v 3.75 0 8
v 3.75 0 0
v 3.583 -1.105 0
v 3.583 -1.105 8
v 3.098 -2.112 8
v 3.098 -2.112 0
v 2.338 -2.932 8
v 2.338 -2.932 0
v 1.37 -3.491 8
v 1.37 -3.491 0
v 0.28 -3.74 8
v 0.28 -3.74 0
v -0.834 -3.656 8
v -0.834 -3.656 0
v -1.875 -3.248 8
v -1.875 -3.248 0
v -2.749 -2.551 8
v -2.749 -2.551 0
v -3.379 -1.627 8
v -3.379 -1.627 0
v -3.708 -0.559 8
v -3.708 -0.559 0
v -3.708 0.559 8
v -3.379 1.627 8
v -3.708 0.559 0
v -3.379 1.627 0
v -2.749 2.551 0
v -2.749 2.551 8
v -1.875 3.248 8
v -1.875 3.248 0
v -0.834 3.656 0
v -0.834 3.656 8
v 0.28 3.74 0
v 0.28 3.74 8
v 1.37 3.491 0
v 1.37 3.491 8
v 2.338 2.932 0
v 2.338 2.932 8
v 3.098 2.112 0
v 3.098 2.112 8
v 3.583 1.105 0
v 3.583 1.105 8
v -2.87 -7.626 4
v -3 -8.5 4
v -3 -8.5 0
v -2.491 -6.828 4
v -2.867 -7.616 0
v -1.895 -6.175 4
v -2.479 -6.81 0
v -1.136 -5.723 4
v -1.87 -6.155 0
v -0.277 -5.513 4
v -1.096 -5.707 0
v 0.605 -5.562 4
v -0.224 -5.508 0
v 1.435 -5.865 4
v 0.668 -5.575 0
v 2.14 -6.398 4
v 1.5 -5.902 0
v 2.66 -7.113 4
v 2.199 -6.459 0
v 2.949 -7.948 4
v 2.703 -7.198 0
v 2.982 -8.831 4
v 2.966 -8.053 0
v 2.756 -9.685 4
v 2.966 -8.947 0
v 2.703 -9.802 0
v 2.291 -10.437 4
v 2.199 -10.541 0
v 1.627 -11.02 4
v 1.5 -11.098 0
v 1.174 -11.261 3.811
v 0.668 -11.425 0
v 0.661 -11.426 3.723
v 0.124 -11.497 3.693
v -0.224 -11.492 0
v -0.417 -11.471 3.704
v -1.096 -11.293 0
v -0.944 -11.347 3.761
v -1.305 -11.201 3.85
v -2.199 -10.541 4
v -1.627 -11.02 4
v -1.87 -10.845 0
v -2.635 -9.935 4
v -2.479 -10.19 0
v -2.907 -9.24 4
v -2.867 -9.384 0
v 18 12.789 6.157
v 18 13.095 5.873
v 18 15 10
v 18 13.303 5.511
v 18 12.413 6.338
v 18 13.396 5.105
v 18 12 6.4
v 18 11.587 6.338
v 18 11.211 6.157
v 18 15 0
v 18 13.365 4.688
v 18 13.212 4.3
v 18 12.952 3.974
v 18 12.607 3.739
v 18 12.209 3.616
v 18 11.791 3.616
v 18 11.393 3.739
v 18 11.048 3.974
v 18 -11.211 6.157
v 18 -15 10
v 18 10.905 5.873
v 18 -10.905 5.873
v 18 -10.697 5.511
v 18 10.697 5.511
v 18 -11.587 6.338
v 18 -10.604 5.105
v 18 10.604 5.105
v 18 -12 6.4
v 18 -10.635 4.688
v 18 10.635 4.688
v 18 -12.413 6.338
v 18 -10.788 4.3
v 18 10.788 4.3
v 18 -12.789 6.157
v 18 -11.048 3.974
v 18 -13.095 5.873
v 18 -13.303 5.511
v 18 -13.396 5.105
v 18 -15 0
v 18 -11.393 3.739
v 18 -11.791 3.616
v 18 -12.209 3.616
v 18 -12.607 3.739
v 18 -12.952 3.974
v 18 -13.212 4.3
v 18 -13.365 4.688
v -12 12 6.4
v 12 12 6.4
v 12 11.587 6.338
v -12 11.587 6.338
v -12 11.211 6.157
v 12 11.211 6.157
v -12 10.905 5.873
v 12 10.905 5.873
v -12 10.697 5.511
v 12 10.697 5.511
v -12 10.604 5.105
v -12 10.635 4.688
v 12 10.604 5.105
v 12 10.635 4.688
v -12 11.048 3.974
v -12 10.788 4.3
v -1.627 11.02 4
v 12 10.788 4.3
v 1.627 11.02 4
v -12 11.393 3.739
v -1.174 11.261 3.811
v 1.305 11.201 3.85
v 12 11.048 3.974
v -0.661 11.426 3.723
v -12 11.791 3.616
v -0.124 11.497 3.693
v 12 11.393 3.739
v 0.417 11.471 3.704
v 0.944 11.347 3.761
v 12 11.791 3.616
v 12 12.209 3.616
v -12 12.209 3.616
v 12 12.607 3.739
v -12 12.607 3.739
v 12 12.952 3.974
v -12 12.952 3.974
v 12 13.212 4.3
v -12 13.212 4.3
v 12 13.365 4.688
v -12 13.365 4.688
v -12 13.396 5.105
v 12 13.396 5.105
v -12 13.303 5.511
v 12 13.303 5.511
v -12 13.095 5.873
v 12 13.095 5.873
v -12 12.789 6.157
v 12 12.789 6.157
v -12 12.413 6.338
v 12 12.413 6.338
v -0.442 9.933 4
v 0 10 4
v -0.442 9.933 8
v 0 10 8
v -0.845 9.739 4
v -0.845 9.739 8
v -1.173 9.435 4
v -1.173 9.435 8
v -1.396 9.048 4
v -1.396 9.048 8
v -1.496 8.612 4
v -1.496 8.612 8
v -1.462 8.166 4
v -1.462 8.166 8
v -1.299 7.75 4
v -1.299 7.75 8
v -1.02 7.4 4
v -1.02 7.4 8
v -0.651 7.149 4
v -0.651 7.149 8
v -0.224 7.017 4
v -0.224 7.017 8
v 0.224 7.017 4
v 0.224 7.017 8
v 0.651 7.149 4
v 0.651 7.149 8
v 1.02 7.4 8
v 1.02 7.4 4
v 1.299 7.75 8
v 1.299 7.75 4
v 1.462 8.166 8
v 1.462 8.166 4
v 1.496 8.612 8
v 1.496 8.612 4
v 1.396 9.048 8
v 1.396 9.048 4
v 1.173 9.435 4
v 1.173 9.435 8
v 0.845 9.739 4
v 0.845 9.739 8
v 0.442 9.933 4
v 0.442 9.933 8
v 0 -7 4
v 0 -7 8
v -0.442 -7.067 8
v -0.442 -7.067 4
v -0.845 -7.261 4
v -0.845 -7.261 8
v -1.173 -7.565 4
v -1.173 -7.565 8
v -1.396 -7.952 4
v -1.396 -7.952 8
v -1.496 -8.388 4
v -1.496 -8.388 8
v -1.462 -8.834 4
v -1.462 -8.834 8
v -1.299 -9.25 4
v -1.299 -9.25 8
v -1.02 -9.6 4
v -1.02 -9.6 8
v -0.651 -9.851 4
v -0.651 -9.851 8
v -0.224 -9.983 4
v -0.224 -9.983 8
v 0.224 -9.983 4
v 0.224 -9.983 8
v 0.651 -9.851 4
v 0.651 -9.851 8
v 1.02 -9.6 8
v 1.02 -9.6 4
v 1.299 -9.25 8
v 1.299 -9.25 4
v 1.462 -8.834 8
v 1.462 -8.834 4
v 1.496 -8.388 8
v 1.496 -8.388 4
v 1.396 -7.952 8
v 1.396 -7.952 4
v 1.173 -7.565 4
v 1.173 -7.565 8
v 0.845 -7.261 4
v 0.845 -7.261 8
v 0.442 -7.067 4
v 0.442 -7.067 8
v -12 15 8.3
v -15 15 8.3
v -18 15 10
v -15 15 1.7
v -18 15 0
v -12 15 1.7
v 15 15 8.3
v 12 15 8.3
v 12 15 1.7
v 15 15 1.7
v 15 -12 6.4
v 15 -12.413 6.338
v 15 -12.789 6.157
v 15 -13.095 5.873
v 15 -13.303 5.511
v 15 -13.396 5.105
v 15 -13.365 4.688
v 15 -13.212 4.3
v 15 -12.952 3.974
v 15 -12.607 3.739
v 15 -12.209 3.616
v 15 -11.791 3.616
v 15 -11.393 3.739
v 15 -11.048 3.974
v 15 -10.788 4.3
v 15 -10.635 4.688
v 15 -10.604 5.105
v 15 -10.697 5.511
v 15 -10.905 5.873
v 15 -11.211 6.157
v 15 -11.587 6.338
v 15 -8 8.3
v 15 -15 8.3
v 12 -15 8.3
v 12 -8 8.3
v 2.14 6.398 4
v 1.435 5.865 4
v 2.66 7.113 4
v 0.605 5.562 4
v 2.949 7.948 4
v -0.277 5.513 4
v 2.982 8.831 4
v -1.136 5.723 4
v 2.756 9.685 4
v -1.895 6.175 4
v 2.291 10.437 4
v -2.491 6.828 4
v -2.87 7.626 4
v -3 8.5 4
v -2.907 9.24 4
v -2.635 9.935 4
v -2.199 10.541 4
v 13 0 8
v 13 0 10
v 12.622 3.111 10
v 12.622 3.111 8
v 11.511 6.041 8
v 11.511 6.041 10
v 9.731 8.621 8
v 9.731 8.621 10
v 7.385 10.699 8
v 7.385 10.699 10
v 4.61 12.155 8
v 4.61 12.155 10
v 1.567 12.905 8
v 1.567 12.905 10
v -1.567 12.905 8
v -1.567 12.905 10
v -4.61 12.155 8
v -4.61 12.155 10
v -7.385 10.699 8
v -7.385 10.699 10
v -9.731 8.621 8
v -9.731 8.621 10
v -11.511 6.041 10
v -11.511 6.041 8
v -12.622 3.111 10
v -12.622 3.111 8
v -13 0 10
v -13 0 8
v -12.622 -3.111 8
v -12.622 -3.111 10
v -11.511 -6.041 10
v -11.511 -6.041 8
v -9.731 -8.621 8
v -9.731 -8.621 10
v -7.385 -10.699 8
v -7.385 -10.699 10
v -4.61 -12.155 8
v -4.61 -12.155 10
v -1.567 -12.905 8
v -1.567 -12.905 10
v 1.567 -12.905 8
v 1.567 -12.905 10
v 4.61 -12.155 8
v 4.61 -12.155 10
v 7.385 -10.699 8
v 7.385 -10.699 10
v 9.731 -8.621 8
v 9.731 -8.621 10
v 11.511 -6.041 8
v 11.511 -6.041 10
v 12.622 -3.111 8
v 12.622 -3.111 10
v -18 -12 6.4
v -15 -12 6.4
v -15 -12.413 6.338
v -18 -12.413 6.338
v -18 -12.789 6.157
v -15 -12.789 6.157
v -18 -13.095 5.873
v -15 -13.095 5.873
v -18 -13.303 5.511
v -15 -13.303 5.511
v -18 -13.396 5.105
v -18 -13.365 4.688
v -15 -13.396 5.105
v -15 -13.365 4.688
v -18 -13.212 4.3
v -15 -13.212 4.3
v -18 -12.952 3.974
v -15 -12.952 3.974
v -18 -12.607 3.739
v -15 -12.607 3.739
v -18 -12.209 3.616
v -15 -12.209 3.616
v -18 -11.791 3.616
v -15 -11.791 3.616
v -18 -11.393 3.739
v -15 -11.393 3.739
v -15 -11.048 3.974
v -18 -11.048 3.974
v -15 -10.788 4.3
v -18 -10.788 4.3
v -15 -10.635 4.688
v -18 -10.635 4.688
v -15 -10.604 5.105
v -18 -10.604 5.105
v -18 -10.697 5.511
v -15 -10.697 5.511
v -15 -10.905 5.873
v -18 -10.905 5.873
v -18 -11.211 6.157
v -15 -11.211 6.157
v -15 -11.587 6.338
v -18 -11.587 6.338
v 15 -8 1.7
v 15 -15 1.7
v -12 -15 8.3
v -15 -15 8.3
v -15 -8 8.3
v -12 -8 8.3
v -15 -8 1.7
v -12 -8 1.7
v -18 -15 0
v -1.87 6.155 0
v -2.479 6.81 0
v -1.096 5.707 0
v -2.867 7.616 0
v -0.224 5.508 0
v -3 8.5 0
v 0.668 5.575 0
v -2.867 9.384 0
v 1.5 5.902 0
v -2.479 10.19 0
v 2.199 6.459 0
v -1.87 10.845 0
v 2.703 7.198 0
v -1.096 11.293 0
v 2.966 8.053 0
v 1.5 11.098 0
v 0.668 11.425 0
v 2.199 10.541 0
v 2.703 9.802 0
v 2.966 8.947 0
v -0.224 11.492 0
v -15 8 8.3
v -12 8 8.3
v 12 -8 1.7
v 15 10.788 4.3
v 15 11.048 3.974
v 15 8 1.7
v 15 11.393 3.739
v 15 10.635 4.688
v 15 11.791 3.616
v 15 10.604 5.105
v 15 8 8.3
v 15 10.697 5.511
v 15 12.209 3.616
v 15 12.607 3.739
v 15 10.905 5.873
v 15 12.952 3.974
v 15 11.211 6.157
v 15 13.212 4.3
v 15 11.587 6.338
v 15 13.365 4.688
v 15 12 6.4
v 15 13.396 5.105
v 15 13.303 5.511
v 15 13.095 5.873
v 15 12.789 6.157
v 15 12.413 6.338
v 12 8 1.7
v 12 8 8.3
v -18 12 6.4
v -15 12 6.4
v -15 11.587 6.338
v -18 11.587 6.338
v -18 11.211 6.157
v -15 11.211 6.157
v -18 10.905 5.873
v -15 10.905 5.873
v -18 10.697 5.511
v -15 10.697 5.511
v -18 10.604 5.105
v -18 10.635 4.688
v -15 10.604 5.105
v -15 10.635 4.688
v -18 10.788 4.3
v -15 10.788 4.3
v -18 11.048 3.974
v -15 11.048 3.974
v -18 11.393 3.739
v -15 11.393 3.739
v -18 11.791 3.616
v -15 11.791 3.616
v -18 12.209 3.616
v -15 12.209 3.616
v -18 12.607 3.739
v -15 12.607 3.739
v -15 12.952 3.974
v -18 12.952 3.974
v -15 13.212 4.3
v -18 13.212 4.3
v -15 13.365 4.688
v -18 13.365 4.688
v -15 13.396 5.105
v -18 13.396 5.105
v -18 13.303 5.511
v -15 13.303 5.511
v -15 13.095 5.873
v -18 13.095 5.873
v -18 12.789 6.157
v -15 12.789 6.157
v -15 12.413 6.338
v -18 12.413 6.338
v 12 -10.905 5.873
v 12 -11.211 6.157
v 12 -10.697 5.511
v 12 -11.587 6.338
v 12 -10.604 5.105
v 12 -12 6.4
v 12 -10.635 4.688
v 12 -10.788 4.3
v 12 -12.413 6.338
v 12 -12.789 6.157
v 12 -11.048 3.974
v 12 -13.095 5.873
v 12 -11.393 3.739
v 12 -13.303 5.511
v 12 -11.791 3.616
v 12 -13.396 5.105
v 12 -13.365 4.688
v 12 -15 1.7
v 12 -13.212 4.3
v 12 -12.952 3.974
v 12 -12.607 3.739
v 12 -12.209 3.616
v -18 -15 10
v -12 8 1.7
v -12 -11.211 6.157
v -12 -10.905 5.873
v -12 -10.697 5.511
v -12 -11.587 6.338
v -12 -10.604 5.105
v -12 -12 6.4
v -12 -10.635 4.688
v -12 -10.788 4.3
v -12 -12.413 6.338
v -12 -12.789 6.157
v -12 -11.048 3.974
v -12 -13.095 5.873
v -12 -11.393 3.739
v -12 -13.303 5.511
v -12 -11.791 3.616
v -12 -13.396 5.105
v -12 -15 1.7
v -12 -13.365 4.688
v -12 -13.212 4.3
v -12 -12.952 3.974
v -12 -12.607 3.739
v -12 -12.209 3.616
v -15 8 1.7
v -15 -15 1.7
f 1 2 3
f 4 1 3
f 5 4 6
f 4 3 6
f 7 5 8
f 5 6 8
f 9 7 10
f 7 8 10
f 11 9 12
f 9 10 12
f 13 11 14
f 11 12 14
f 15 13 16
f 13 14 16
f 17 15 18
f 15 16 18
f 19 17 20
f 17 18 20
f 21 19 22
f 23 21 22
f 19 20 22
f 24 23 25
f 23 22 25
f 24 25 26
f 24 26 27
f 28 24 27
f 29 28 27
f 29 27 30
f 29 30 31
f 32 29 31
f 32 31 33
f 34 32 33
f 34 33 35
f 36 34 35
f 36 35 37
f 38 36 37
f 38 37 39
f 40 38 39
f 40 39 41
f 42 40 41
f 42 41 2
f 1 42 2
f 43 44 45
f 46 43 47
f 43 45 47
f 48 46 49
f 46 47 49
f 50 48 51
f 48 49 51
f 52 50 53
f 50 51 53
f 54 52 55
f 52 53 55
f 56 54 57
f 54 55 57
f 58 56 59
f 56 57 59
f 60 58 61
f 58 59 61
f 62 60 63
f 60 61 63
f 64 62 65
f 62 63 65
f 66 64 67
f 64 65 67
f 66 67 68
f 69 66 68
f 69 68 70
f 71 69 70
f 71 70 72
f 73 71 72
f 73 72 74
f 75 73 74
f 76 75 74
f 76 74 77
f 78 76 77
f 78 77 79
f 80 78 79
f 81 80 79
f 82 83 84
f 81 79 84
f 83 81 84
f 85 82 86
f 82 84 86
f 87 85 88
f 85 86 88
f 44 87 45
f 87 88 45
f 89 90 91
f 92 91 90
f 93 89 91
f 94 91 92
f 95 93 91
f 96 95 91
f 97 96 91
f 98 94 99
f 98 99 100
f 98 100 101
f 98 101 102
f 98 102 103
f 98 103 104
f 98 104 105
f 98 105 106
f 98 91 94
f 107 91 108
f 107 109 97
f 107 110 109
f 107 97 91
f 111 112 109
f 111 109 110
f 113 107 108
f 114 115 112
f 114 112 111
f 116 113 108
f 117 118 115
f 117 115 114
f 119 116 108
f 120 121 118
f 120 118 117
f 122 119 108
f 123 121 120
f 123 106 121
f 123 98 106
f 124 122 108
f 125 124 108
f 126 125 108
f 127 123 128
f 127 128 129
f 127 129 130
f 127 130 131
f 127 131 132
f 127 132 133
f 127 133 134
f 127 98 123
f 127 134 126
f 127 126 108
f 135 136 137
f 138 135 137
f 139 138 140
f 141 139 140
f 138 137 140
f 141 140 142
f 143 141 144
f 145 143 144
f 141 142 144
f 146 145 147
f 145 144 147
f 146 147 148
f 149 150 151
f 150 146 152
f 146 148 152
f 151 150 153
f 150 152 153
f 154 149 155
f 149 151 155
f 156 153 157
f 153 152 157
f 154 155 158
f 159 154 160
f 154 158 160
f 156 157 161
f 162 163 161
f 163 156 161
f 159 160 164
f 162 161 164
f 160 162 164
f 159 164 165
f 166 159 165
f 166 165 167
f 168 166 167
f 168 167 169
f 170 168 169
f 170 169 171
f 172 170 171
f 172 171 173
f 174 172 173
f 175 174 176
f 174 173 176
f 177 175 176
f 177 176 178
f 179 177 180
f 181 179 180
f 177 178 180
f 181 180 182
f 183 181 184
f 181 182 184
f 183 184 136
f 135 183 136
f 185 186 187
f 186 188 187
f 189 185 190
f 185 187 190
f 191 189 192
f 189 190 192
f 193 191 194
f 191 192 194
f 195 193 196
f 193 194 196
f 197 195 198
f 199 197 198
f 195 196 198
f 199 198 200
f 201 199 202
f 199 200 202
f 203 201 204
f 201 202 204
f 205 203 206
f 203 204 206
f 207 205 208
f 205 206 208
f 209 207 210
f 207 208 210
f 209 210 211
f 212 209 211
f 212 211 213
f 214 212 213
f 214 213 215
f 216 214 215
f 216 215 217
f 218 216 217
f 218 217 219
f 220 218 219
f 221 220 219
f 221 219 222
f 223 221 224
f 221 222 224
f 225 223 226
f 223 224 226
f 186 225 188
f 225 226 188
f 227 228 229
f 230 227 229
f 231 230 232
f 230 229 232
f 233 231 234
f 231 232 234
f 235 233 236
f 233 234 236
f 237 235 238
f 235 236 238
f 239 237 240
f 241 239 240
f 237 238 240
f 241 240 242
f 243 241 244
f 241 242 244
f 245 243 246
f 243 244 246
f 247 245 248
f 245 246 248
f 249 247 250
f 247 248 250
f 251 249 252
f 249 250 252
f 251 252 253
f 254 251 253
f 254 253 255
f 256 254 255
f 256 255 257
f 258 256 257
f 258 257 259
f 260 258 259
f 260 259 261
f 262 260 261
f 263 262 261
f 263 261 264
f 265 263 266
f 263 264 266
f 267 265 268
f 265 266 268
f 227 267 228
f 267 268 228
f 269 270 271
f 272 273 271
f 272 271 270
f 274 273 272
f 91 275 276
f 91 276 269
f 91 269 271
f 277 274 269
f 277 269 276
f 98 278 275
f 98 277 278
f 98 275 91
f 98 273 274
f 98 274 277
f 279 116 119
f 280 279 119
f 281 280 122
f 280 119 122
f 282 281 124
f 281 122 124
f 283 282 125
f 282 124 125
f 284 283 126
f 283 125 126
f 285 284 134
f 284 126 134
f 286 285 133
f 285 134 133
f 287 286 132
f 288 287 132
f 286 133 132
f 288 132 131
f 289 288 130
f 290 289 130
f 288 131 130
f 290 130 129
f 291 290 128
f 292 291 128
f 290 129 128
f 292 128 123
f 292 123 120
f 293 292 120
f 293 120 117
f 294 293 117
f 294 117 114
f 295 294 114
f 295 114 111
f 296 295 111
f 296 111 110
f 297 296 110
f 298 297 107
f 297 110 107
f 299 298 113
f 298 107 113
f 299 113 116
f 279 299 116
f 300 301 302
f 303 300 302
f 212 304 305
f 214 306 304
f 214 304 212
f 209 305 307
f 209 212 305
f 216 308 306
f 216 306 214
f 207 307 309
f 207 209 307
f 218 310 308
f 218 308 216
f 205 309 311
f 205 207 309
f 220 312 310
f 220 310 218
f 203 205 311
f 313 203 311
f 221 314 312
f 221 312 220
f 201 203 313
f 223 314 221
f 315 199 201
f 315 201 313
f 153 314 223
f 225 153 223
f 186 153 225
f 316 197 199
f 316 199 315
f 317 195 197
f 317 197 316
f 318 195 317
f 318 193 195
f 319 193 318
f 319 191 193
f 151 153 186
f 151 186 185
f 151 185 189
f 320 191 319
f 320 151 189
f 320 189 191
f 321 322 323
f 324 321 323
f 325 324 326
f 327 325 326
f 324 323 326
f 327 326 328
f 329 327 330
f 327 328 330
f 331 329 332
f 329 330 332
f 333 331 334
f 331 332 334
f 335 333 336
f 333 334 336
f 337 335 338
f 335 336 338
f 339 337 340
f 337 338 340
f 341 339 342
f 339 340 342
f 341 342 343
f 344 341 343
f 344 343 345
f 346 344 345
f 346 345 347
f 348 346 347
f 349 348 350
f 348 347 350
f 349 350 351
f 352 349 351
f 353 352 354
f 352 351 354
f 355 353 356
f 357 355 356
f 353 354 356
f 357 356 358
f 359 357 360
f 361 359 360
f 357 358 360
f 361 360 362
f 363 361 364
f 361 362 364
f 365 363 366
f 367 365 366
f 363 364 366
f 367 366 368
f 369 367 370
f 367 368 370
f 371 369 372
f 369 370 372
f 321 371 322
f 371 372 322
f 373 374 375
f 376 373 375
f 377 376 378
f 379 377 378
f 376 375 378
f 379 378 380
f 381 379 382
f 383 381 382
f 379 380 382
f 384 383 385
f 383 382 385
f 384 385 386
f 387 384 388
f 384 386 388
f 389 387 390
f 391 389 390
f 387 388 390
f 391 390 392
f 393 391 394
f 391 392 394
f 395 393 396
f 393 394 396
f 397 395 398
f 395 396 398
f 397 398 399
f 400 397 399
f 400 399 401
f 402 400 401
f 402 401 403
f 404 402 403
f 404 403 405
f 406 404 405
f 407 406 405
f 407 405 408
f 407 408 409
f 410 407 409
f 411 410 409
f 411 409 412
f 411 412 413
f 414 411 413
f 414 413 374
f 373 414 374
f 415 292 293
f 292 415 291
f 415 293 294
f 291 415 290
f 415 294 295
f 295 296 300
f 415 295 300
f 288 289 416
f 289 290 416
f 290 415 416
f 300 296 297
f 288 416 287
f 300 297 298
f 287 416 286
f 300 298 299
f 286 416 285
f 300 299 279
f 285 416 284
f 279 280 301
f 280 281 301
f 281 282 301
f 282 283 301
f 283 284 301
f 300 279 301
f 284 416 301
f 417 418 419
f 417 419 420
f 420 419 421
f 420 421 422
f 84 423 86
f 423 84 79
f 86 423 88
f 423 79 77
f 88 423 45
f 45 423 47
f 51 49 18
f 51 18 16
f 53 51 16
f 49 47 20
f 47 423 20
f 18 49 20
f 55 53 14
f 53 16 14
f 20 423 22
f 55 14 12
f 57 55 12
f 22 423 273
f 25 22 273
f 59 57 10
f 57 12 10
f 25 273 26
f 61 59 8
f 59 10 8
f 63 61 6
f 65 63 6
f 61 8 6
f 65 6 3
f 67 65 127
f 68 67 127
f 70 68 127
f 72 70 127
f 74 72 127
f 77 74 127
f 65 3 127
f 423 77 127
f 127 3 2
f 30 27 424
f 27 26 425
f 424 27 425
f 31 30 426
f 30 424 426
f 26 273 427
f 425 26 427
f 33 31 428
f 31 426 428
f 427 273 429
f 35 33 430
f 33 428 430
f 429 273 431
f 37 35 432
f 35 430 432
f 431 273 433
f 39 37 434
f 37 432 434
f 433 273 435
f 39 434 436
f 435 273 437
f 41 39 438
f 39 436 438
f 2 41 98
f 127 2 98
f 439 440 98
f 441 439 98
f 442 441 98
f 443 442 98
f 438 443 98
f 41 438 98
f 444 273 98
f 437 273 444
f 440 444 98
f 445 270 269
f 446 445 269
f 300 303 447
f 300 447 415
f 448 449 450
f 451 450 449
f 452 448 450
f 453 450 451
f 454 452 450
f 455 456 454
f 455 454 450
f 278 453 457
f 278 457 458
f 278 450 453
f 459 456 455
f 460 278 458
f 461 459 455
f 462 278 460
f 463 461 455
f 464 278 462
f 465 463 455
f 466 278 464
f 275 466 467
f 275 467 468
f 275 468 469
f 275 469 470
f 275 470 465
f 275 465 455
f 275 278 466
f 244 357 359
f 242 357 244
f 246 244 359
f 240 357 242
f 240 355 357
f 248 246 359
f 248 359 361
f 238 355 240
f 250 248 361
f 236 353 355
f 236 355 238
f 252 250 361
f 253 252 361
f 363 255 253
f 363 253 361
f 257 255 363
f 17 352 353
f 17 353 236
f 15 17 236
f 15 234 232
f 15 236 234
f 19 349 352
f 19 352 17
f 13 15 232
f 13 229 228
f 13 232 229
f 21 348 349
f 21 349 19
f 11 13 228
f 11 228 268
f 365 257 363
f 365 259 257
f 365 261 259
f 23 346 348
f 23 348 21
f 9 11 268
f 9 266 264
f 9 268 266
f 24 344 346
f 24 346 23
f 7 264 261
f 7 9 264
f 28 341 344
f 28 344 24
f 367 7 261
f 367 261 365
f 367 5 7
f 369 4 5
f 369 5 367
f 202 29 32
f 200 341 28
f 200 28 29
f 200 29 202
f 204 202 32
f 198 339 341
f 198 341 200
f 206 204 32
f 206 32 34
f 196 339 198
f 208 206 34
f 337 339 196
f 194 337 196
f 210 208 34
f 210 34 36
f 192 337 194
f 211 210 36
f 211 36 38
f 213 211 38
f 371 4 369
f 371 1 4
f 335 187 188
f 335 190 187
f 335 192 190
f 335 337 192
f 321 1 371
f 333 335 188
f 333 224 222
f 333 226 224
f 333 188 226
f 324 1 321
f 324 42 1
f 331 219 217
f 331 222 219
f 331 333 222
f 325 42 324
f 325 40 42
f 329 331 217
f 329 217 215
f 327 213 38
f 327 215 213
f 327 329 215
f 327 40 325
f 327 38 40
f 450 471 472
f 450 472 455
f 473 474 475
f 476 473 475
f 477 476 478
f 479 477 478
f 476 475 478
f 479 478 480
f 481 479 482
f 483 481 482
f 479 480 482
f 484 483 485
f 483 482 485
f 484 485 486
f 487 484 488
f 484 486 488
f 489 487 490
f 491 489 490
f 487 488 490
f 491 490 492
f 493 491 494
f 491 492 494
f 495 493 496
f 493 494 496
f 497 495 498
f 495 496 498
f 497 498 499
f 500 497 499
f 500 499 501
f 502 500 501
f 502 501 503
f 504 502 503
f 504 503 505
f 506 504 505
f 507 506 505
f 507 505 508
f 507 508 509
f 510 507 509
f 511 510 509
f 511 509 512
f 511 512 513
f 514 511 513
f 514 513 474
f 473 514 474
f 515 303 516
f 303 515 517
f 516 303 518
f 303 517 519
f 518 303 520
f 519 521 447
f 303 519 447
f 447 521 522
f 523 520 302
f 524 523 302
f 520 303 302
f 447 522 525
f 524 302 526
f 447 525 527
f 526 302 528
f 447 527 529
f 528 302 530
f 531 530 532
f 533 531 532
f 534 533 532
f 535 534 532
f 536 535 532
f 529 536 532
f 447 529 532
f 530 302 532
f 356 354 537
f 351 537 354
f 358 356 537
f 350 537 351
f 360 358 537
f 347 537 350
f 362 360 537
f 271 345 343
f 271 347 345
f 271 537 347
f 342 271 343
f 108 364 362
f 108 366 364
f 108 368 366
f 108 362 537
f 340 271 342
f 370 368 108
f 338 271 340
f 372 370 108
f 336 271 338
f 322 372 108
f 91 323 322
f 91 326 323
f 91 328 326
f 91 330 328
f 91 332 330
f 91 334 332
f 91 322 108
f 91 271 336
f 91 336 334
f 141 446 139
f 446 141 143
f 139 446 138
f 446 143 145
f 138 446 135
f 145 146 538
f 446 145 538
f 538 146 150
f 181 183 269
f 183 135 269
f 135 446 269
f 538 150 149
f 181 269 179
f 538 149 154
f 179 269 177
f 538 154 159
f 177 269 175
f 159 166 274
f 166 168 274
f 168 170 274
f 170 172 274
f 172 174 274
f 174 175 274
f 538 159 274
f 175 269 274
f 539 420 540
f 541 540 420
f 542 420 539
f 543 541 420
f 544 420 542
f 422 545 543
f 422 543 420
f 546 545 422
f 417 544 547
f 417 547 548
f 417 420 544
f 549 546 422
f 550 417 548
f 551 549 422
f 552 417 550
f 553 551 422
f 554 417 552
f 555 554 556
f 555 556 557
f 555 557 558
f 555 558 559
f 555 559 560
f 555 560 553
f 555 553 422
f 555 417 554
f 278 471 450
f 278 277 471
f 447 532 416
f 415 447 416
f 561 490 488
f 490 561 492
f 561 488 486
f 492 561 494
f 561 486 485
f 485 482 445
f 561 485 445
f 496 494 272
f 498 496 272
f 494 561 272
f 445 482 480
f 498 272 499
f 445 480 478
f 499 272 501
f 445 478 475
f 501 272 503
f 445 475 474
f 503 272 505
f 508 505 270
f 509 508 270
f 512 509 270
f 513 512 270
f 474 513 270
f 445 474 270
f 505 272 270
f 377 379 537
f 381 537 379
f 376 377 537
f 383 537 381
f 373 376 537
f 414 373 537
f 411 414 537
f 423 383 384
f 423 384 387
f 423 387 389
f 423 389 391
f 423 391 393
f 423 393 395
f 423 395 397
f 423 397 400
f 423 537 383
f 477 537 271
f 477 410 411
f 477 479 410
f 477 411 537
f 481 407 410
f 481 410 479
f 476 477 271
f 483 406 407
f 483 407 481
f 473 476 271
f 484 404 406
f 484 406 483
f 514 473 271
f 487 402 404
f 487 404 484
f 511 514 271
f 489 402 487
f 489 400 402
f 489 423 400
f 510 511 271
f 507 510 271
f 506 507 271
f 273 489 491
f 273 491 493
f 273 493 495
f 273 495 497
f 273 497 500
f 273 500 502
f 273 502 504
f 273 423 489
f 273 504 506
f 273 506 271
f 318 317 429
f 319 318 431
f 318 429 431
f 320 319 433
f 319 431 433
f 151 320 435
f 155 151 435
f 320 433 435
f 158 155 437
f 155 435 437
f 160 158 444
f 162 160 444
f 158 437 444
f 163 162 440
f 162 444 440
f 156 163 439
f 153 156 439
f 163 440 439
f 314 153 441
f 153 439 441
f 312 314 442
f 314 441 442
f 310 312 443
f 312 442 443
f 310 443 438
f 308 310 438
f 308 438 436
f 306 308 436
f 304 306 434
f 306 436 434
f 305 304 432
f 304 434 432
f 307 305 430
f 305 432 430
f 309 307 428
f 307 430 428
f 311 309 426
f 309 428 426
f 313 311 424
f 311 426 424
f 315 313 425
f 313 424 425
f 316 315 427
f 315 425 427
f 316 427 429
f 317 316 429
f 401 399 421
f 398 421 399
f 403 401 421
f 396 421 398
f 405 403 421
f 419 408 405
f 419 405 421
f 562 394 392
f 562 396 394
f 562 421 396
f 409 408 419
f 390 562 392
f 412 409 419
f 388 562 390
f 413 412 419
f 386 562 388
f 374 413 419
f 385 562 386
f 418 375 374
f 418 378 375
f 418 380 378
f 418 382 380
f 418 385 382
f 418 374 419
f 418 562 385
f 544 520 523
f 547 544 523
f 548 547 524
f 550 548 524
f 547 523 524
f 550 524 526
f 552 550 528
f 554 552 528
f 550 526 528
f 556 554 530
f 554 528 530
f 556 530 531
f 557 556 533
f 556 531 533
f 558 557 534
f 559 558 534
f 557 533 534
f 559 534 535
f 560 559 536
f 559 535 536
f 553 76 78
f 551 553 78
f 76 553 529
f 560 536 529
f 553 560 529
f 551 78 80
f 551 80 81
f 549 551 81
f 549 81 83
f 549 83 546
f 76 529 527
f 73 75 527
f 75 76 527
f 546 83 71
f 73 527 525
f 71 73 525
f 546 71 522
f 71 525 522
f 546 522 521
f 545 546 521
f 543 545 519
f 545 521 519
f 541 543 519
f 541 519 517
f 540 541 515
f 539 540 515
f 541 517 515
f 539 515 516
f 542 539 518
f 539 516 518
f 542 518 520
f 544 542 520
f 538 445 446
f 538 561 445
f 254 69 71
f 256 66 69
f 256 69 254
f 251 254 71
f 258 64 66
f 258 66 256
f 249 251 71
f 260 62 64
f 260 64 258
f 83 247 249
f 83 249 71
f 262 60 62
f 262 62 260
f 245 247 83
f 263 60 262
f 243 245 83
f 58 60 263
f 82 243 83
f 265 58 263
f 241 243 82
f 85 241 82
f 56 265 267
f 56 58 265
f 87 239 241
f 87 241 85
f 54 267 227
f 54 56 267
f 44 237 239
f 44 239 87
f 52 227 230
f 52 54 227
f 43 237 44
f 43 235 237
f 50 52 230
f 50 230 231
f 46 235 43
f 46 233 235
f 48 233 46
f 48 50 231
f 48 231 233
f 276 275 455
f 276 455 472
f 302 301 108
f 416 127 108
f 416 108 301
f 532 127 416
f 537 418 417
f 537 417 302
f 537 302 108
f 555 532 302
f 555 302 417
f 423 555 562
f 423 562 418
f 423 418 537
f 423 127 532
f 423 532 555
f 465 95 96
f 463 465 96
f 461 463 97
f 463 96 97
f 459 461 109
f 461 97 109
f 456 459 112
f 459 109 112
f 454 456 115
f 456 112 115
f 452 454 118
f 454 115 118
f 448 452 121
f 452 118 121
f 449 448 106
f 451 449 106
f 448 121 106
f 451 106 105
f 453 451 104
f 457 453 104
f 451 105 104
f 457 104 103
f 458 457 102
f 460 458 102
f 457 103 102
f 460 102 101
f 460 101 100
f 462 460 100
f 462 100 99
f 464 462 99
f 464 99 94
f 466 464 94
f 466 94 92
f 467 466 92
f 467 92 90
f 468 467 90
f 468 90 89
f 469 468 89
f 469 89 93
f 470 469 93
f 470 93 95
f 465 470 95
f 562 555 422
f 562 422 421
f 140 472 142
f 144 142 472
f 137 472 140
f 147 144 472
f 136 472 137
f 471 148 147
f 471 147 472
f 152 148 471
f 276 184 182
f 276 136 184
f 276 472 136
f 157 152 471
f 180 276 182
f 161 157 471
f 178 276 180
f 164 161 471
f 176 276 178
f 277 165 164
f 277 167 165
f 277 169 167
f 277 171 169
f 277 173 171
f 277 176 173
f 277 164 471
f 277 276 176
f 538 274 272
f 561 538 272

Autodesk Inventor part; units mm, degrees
ref_plane "YZ Plane" through (0, 0, 0) normal (1, 0, 0) x (0, 1, 0)
ref_plane "XZ Plane" through (0, 0, 0) normal (0, 1, 0) x (-1, 0, 0)
ref_plane "XY Plane" through (0, 0, 0) normal (0, 0, 1) x (1, 0, 0)
sketch "Sketch1" plane through (0, 0, 0) normal (0, 0, 1) x (1, 0, 0)
  circle A0 centre (0, 0) radius 15
  circle A1 centre (0, 0) radius 8.5
  line L0 (0, 8.5) -> (0, -8.5)
  circle A2 centre (0, 0) radius 3.75
  line L1 (18, -15) -> (-18, -15)
  line L2 (-18, -15) -> (-18, 15)
  line L3 (-18, 15) -> (18, 15)
  line L4 (18, 15) -> (18, -15)
  point P0 (0, 15)
  point P1 (0, -15)
  dimension "d0" = 30
  dimension "d1" = 17
  dimension "d2" = 7.5
  dimension "d15" = 30
  dimension "d16" = 36
  dimension "d17" = 18
  dimension "d18" = 15
extrude "Extrusion1" add sketch "Sketch1" along normal blind 10 contours A0 | A1 L0 A2 | L0 A2 A1
hole "Hole1" at (0, 8.5, 0) at (0, -8.5, 0) direction (0, 0, 1) diameter 3 end through all
sketch "Sketch2" plane through (0, 0, 10) normal (0, 0, 1) x (1, 0, 0)
  circle A0 centre (0, 0) radius 13
  dimension "d12" = 26
extrude "Extrusion2" cut sketch "Sketch2" against normal blind 2
extrude "Extrusion3" add sketch "Sketch1" along normal blind 10 contours A0 L3 L4 L1 | A0 L1 L2 L3
sketch "Sketch4" plane through (-18, -15, 0) normal (-1, 0, 0) x (0, 0, 1)
  line L0 (5, 27) -> (5, 3)
  line L1 (0, 30) -> (0, 0) projected
  line L2 (0, 0) -> (10, 0) projected
  line L3 (0, 30) -> (10, 30) projected
  point P0 (0, 15)
  dimension "d21" = 5
  dimension "d22" = 24
  dimension "d23" = 3
  dimension "d24" = 3
hole "Hole2" at (-18, 12, 5) at (-18, -12, 5) direction (1, 0, 0) diameter 2.8 end through all
sketch "Sketch5" plane through (18, -15, 0) normal (1, 0, 0) x (0, 0, -1)
  circle A0 centre (-5, 27) radius 1.4 projected
  line L0 (-5, 27) -> (-5, 3)
  line L1 (0, 5) -> (-8, 5) projected
  point P0 (0, 15)
  dimension "d32" = 24
hole "Hole3" at (18, 12, 5) at (18, -12, 5) direction (-1, 0, 0) diameter 2.8 depth 8
sketch "Sketch6" plane through (-18, -15, 0) normal (0, -1, 0) x (1, 0, 0)
  line L0 (3, 8.3) -> (6, 8.3)
  line L1 (6, 8.3) -> (6, 1.7)
  line L2 (6, 1.7) -> (3, 1.7)
  line L3 (3, 1.7) -> (3, 8.3)
  line L4 (0, 10) -> (36, 10) projected
  line L5 (0, 0) -> (0, 10) projected
  line L6 (33, 8.3) -> (30, 8.3)
  line L7 (30, 8.3) -> (30, 1.7)
  line L8 (30, 1.7) -> (33, 1.7)
  line L9 (33, 1.7) -> (33, 8.3)
  line L10 (36, 0) -> (36, 10) projected
  line L11 (0, 0) -> (36, 0) projected
  point P0 (18, 0)
  dimension "d40" = 6.6
  dimension "d41" = 3
  dimension "d42" = 1.7
  dimension "d43" = 3
  dimension "d44" = 3
  dimension "d45" = 3
  dimension "d46" = 6.6
  dimension "d47" = 1.7
extrude "Extrusion4" cut sketch "Sketch6" against normal blind 7 contours L0 L1 L2 L3 | L9 L8 L7 L6
sketch "Sketch7" plane through (-18, 15, 0) normal (0, 1, 0) x (1, 0, 0)
  line L0 (33, -8.3) -> (30, -8.3)
  line L1 (30, -8.3) -> (30, -1.7)
  line L2 (30, -1.7) -> (33, -1.7)
  line L3 (33, -1.7) -> (33, -8.3)
  line L4 (3, -8.3) -> (6, -8.3)
  line L5 (6, -8.3) -> (6, -1.7)
  line L6 (6, -1.7) -> (3, -1.7)
  line L7 (3, -1.7) -> (3, -8.3)
  line L8 (0, 0) -> (0, -10) projected
  line L9 (36, 0) -> (36, -10) projected
  line L10 (36, 0) -> (0, 0) projected
  point P0 (18, 0)
  dimension "d50" = 3
  dimension "d51" = 3
  dimension "d52" = 3
  dimension "d53" = 3
  dimension "d54" = 1.7
  dimension "d55" = 1.7
  dimension "d56" = 6.6
  dimension "d57" = 6.6
extrude "Extrusion5" cut sketch "Sketch7" against normal blind 7
sketch "Sketch8" plane through (0, 0, 0) normal (0, 0, -1) x (-1, 0, 0)
  circle A0 centre (0, -8.5) radius 1.5 projected
  circle A1 centre (0, 8.5) radius 1.5 projected
  circle A2 centre (0, -8.5) radius 1.5 projected
  circle A3 centre (0, -8.5) radius 3
  circle A4 centre (0, 8.5) radius 1.5 projected
  circle A5 centre (0, 8.5) radius 3
  point P0 (0, 0)
  dimension "d60" = 6
  dimension "d61" = 6
extrude "Extrusion6" cut sketch "Sketch8" against normal blind 4
properties part number "motorfogo" material "PC/ABS Plastic"
